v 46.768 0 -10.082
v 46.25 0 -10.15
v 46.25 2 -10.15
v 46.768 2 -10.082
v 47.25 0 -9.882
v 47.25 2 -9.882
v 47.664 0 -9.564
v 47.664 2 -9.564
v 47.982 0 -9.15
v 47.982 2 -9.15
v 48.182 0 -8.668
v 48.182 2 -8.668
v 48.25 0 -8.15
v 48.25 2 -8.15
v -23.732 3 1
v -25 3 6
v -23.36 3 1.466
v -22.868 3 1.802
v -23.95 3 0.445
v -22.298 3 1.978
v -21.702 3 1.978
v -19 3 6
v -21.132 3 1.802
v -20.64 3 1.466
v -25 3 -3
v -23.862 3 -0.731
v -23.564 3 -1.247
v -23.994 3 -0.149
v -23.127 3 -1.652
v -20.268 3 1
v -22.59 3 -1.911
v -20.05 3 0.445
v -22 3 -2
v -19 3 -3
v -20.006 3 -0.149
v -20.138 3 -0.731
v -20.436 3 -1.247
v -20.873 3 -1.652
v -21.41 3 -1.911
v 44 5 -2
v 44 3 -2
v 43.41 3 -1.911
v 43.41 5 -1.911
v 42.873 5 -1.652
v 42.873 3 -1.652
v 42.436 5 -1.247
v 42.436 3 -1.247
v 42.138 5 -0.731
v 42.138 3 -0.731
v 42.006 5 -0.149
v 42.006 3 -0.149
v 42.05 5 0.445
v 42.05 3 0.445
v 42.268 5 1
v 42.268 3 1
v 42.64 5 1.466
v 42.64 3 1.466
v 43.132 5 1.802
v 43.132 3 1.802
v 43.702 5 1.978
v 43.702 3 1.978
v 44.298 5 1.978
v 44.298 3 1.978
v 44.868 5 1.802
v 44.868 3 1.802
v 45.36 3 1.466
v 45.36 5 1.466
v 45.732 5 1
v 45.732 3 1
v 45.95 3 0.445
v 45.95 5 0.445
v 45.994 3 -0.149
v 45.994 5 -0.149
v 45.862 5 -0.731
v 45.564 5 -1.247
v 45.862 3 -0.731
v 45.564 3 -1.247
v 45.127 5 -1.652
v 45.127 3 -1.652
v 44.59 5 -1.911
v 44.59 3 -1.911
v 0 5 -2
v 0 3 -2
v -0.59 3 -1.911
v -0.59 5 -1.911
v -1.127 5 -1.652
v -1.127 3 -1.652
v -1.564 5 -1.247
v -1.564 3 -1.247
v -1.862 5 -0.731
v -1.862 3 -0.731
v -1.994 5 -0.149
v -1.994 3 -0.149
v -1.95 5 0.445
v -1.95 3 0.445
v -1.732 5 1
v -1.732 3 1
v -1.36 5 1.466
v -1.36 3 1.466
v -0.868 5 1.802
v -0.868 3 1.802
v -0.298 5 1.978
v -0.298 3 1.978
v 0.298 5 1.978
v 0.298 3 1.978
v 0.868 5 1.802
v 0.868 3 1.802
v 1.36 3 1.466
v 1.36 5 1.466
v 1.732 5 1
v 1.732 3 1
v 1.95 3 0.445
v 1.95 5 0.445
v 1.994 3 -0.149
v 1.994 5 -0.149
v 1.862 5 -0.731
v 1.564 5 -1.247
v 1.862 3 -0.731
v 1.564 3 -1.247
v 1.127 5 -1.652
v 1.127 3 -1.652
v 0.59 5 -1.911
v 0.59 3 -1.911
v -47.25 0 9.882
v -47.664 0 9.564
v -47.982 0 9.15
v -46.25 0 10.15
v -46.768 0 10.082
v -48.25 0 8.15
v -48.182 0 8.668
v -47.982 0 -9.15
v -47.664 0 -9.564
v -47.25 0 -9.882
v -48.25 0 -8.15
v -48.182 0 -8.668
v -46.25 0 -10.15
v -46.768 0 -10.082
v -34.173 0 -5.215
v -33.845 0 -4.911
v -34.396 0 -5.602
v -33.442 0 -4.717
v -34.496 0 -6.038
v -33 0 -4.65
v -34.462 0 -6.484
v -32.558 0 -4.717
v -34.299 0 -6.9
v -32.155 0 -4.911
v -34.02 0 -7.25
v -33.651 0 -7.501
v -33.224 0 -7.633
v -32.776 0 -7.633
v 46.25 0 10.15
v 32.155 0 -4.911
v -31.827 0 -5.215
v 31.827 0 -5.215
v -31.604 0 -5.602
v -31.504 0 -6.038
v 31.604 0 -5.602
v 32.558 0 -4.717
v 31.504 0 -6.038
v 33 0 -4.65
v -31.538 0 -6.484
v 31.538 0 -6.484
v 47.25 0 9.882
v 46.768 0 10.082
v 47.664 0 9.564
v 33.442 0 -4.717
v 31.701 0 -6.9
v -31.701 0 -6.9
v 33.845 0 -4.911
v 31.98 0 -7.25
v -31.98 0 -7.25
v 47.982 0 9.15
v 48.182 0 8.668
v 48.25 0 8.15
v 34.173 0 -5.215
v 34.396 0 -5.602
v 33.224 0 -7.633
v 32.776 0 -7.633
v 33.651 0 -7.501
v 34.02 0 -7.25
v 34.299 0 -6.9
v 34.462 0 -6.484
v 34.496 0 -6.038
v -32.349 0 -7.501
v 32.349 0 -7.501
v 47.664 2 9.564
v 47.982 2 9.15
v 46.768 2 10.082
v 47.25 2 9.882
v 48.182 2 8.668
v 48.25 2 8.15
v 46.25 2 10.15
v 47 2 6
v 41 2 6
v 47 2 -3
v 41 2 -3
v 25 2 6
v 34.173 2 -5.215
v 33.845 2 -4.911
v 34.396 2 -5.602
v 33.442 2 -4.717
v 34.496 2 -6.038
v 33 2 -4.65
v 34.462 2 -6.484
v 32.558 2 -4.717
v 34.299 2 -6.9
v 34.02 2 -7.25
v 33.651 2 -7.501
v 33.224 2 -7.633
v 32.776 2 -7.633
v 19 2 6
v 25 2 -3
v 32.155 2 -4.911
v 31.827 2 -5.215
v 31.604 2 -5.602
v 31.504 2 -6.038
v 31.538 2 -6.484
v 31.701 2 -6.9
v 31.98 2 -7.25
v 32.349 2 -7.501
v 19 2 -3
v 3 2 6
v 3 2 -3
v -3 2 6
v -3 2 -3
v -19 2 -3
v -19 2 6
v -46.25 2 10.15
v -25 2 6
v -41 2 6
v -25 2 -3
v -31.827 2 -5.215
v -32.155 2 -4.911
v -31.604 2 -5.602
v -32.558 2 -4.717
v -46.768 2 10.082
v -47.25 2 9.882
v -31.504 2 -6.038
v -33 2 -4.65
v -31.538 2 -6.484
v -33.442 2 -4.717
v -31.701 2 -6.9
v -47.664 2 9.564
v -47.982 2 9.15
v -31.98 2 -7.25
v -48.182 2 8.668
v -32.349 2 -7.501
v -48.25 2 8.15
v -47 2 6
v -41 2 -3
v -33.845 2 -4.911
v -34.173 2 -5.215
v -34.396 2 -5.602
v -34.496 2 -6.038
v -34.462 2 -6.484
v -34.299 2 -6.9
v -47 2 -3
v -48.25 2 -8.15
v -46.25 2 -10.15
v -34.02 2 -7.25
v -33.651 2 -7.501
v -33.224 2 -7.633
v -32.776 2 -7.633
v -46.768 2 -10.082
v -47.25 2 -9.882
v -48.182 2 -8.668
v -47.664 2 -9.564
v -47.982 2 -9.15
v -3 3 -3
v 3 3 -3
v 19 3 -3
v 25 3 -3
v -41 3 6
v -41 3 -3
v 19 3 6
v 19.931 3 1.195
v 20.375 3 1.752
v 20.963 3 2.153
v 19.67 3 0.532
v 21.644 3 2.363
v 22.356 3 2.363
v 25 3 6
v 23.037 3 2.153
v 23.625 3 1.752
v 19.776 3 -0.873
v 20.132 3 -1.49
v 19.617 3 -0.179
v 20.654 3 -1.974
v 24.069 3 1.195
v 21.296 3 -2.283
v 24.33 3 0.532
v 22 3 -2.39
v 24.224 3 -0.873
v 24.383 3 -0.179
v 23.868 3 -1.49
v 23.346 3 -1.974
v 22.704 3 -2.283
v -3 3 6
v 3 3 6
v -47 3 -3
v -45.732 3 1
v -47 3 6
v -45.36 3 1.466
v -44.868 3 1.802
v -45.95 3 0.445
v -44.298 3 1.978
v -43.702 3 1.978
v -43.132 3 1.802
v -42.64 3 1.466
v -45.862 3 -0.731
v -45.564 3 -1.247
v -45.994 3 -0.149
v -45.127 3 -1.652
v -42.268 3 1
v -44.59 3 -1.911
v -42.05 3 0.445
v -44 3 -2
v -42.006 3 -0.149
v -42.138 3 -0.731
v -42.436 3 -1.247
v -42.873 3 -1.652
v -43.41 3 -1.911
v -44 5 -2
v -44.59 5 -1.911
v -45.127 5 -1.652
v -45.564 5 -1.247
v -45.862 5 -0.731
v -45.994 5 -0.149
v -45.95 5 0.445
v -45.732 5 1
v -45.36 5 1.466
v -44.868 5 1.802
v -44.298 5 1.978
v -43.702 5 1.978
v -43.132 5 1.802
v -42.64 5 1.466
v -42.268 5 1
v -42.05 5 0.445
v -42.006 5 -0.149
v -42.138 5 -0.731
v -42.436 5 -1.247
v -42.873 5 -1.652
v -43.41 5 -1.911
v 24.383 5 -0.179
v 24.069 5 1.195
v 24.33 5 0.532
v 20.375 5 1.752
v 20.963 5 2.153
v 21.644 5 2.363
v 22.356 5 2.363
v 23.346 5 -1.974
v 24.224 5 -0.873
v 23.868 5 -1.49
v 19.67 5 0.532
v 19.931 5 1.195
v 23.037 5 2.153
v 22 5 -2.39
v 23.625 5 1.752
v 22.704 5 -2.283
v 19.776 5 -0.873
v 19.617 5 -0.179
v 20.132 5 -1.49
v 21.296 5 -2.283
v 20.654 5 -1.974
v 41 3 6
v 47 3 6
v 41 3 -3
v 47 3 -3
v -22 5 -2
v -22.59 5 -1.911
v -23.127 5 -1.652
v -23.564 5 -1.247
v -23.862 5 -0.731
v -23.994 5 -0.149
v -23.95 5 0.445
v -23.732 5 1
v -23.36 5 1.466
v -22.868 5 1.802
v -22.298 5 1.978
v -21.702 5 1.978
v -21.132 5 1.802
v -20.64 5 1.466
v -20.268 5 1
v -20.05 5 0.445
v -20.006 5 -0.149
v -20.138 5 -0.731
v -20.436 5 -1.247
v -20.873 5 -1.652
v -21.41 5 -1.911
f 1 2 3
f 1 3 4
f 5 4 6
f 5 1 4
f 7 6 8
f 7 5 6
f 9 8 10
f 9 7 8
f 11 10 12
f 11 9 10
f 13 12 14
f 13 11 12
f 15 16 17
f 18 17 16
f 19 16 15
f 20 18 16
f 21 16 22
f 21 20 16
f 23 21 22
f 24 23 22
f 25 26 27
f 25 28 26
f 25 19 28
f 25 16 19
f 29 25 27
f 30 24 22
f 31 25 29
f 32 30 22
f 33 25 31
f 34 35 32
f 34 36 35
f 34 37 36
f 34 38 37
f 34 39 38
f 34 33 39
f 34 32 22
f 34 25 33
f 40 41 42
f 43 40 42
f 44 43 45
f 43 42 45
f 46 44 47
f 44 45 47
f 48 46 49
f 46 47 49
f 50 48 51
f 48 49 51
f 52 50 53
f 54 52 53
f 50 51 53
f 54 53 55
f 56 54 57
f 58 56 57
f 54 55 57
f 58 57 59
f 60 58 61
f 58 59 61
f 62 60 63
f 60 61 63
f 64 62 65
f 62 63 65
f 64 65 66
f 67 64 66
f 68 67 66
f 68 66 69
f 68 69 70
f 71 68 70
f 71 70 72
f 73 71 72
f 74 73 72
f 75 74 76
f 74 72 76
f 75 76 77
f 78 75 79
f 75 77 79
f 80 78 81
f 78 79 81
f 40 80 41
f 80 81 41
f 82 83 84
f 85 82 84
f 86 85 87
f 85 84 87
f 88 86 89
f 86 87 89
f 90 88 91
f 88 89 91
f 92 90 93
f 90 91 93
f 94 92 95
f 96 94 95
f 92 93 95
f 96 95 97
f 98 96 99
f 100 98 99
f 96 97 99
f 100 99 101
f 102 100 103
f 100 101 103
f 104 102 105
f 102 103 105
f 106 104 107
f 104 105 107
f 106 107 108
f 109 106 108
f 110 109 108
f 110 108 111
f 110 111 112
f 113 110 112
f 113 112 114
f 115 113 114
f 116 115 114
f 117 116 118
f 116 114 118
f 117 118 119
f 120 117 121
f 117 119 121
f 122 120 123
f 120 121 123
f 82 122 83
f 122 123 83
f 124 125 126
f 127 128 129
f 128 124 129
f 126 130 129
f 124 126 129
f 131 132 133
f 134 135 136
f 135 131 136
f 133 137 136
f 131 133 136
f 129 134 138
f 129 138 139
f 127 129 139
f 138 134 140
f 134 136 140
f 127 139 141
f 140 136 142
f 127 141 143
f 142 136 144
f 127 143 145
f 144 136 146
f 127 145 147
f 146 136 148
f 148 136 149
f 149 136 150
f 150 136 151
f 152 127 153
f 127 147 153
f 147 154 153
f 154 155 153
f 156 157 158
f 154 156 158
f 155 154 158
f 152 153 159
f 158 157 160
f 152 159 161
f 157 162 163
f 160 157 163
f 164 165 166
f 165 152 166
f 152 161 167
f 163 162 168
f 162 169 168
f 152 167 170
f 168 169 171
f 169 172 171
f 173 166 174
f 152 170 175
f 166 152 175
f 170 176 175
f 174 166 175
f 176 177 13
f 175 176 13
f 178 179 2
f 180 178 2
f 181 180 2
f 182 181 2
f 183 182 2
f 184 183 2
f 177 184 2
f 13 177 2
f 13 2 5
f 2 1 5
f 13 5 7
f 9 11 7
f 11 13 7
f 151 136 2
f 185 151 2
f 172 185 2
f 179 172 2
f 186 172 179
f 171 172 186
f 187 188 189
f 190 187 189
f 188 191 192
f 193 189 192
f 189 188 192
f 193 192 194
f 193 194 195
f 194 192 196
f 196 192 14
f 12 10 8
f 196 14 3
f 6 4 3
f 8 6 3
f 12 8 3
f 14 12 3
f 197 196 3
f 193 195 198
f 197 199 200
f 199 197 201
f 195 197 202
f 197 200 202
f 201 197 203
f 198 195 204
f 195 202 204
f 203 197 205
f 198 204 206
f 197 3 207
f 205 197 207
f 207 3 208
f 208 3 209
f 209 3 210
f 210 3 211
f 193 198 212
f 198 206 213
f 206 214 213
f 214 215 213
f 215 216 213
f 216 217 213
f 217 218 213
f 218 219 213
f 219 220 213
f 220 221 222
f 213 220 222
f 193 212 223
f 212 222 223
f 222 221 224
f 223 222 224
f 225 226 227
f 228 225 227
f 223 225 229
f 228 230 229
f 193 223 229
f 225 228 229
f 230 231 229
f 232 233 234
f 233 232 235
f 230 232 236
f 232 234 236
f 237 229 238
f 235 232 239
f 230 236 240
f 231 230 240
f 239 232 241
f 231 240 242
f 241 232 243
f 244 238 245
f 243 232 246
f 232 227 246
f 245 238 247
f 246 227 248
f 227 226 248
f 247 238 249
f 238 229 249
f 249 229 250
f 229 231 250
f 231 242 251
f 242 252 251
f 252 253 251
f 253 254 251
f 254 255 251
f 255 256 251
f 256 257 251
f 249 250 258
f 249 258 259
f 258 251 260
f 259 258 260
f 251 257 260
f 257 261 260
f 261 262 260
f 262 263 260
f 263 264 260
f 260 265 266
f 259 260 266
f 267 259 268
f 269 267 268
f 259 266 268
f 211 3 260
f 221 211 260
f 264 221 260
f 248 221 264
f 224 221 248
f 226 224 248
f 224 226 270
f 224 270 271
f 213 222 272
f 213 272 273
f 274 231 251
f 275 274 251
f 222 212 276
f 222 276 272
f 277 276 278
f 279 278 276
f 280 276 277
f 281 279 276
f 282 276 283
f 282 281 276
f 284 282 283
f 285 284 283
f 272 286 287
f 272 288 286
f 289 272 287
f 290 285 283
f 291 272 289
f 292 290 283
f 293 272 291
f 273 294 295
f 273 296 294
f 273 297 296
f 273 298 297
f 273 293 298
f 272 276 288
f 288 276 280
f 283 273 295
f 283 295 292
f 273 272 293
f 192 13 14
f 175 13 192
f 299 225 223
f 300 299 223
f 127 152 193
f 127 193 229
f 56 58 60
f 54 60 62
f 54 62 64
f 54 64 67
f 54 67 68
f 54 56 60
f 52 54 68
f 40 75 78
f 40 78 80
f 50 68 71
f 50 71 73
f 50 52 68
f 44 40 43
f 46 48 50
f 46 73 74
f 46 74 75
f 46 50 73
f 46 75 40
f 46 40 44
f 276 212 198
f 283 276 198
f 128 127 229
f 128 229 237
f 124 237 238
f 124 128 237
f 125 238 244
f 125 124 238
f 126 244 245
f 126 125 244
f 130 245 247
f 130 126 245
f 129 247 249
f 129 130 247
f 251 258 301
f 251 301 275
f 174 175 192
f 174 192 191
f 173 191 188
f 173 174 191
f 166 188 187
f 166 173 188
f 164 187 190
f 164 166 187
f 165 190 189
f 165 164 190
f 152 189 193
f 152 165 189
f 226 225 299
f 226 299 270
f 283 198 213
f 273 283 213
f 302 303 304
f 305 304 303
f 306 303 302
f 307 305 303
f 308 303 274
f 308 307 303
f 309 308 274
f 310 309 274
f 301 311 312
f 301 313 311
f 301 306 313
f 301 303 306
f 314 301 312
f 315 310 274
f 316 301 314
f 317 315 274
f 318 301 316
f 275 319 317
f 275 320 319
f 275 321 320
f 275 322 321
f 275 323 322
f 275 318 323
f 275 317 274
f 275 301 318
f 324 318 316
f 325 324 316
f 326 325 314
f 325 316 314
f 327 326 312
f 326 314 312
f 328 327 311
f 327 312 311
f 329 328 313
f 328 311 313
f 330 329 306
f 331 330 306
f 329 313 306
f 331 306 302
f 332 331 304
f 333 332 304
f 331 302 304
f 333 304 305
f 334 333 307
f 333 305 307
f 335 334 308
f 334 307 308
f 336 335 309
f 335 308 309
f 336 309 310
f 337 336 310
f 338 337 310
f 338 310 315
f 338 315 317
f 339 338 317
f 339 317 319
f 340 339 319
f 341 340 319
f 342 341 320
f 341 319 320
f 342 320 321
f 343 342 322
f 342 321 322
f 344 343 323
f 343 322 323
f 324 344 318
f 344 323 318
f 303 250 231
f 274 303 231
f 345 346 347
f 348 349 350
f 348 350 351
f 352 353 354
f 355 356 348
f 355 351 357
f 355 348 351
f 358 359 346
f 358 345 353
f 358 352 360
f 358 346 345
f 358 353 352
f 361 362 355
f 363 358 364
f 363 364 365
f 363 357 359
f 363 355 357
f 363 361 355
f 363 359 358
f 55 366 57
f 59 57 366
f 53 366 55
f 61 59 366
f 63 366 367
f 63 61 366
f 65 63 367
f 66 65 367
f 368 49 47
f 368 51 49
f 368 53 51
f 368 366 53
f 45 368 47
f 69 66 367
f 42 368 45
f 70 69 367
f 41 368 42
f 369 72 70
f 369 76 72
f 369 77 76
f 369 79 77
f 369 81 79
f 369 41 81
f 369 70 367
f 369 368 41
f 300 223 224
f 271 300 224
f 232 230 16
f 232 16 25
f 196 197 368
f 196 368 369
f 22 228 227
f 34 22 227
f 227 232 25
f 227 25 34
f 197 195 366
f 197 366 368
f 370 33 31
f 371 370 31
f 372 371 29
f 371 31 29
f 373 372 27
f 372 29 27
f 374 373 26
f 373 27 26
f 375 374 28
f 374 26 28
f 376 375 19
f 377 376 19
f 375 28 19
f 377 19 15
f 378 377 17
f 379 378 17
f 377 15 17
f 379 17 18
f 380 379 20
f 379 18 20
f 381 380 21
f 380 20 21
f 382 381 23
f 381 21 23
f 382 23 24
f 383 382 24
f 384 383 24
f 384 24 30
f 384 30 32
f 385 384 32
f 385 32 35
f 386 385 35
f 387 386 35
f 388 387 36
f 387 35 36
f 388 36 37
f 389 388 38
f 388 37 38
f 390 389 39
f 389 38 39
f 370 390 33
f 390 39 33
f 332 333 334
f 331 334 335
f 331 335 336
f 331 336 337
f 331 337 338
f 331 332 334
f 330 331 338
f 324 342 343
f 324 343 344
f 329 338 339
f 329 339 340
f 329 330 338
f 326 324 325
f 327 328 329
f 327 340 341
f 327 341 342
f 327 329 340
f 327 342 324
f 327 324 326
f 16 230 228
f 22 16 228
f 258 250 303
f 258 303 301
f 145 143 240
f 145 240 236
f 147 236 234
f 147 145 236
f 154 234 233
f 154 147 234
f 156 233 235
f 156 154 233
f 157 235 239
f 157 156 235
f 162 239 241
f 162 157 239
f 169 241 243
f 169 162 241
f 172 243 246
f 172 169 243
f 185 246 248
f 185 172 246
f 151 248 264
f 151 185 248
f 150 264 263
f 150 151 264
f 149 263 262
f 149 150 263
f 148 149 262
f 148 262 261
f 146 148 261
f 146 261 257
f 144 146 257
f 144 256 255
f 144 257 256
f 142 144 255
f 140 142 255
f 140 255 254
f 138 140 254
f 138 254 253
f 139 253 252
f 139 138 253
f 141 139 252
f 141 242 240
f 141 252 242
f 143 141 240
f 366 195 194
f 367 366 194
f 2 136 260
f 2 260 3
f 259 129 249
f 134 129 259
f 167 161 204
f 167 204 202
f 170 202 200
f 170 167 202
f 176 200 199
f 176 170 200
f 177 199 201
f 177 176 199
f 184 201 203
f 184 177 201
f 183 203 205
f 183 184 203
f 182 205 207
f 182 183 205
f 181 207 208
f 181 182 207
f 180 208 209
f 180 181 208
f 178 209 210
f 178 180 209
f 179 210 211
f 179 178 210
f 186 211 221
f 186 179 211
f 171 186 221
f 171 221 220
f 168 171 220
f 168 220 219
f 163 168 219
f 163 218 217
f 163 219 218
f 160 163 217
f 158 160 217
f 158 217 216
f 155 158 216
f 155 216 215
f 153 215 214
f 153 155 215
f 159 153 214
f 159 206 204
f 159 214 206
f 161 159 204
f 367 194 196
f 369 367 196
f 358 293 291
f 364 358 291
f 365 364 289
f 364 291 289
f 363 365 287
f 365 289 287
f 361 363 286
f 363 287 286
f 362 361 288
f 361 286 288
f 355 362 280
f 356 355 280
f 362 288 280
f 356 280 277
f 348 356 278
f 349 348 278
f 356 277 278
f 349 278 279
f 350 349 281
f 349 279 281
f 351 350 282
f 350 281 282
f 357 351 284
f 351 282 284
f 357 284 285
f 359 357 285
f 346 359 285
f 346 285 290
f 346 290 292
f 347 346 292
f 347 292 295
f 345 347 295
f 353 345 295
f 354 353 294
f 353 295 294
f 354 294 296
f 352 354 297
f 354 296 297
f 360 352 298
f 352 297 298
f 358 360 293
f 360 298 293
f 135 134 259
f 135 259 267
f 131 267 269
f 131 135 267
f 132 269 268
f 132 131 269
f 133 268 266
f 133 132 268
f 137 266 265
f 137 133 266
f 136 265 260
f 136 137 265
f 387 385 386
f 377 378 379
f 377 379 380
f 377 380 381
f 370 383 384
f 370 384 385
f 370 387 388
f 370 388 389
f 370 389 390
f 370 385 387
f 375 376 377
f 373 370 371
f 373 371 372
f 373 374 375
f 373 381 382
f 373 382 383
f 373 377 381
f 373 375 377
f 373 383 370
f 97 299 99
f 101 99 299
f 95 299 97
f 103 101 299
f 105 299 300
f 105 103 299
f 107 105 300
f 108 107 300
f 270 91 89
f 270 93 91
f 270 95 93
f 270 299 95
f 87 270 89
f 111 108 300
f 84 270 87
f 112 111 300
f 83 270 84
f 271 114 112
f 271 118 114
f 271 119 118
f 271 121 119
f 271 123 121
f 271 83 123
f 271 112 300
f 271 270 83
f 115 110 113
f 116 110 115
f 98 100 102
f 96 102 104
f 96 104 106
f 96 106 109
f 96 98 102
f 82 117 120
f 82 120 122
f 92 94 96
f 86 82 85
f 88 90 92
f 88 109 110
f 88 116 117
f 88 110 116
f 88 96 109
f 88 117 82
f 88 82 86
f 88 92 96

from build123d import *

# Parameters (mm, degrees)
EXTRUDE_2_DEPTH          = 2
CUT_EXTRUDE_3_DEPTH      = 50.346580429
CUT_EXTRUDE_3_DEPTH_BACK = 50.346580429
SKETCH_2_R               = 1.5
SKETCH_3_W               = 6
SKETCH_3_H               = 9
EXTRUDE_3_DEPTH          = 3
EXTRUDE_START            = 3
SKETCH_4_R               = 2
SKETCH_4_R_2             = 2.38964589
EXTRUDE_4_DEPTH          = 2


with BuildPart() as part:
    # 草图1 → 凸台-拉伸2 (new body)
    with BuildSketch(Plane(origin=(0, 0, 0), x_dir=(1, 0, 0), z_dir=(0, 1, 0))):
        with BuildLine():
            Line((46.25, -10.15), (-46.25, -10.15))
            ThreePointArc((-46.25, -10.15), (-47.664213562, -9.564213562), (-48.25, -8.15))
            Line((-48.25, -8.15), (-48.25, 8.15))
            ThreePointArc((-48.25, 8.15), (-47.664213562, 9.564213562), (-46.25, 10.15))
            Line((-46.25, 10.15), (46.25, 10.15))
            ThreePointArc((46.25, 10.15), (47.664213562, 9.564213562), (48.25, 8.15))
            Line((48.25, 8.15), (48.25, -8.15))
            ThreePointArc((48.25, -8.15), (47.664213562, -9.564213562), (46.25, -10.15))
        make_face()
    extrude(amount=EXTRUDE_2_DEPTH)

    # 草图2 → 切除-拉伸3 (cut, two sides: drawn at the far end of the back side and taken through both)
    with BuildSketch(Plane(origin=(0, 0, 0), x_dir=(1, 0, 0), z_dir=(0, 1, 0)).offset(-CUT_EXTRUDE_3_DEPTH_BACK)):
        with Locations(Location((-33, 6.15, 0), (0, 0, 270))):
            Circle(SKETCH_2_R)
        with Locations(Location((33, 6.15, 0), (0, 0, 270))):
            Circle(SKETCH_2_R)
    extrude(amount=CUT_EXTRUDE_3_DEPTH + CUT_EXTRUDE_3_DEPTH_BACK, mode=Mode.SUBTRACT)

    # 草图3 → 凸台-拉伸3 (add)
    with BuildSketch(Plane(origin=(0, 0, 0), x_dir=(1, 0, 0), z_dir=(0, 1, 0))):
        with Locations((-44, -1.5)):
            Rectangle(SKETCH_3_W, SKETCH_3_H)
        with Locations((-22, -1.5)):
            Rectangle(SKETCH_3_W, SKETCH_3_H)
        with Locations((0, -1.5)):
            Rectangle(SKETCH_3_W, SKETCH_3_H)
        with Locations((22, -1.5)):
            Rectangle(SKETCH_3_W, SKETCH_3_H)
        with Locations((44, -1.5)):
            Rectangle(SKETCH_3_W, SKETCH_3_H)
    extrude(amount=EXTRUDE_3_DEPTH)

    # 草图4 → 凸台-拉伸4 (add)
    with BuildSketch(Plane(origin=(0, 0, 0), x_dir=(1, 0, 0), z_dir=(0, 1, 0)).offset(EXTRUDE_START)):
        with Locations(Location((-44, 0, 0), (0, 0, 90))):
            Circle(SKETCH_4_R)
        with Locations(Location((-22, 0, 0), (0, 0, 90))):
            Circle(SKETCH_4_R)
        with Locations(Location((0, 0, 0), (0, 0, 90))):
            Circle(SKETCH_4_R)
        with Locations(Location((22, 0, 0), (0, 0, 90))):
            Circle(SKETCH_4_R_2)
        with Locations(Location((44, 0, 0), (0, 0, 90))):
            Circle(SKETCH_4_R)
    extrude(amount=EXTRUDE_4_DEPTH)


solid = part.part
